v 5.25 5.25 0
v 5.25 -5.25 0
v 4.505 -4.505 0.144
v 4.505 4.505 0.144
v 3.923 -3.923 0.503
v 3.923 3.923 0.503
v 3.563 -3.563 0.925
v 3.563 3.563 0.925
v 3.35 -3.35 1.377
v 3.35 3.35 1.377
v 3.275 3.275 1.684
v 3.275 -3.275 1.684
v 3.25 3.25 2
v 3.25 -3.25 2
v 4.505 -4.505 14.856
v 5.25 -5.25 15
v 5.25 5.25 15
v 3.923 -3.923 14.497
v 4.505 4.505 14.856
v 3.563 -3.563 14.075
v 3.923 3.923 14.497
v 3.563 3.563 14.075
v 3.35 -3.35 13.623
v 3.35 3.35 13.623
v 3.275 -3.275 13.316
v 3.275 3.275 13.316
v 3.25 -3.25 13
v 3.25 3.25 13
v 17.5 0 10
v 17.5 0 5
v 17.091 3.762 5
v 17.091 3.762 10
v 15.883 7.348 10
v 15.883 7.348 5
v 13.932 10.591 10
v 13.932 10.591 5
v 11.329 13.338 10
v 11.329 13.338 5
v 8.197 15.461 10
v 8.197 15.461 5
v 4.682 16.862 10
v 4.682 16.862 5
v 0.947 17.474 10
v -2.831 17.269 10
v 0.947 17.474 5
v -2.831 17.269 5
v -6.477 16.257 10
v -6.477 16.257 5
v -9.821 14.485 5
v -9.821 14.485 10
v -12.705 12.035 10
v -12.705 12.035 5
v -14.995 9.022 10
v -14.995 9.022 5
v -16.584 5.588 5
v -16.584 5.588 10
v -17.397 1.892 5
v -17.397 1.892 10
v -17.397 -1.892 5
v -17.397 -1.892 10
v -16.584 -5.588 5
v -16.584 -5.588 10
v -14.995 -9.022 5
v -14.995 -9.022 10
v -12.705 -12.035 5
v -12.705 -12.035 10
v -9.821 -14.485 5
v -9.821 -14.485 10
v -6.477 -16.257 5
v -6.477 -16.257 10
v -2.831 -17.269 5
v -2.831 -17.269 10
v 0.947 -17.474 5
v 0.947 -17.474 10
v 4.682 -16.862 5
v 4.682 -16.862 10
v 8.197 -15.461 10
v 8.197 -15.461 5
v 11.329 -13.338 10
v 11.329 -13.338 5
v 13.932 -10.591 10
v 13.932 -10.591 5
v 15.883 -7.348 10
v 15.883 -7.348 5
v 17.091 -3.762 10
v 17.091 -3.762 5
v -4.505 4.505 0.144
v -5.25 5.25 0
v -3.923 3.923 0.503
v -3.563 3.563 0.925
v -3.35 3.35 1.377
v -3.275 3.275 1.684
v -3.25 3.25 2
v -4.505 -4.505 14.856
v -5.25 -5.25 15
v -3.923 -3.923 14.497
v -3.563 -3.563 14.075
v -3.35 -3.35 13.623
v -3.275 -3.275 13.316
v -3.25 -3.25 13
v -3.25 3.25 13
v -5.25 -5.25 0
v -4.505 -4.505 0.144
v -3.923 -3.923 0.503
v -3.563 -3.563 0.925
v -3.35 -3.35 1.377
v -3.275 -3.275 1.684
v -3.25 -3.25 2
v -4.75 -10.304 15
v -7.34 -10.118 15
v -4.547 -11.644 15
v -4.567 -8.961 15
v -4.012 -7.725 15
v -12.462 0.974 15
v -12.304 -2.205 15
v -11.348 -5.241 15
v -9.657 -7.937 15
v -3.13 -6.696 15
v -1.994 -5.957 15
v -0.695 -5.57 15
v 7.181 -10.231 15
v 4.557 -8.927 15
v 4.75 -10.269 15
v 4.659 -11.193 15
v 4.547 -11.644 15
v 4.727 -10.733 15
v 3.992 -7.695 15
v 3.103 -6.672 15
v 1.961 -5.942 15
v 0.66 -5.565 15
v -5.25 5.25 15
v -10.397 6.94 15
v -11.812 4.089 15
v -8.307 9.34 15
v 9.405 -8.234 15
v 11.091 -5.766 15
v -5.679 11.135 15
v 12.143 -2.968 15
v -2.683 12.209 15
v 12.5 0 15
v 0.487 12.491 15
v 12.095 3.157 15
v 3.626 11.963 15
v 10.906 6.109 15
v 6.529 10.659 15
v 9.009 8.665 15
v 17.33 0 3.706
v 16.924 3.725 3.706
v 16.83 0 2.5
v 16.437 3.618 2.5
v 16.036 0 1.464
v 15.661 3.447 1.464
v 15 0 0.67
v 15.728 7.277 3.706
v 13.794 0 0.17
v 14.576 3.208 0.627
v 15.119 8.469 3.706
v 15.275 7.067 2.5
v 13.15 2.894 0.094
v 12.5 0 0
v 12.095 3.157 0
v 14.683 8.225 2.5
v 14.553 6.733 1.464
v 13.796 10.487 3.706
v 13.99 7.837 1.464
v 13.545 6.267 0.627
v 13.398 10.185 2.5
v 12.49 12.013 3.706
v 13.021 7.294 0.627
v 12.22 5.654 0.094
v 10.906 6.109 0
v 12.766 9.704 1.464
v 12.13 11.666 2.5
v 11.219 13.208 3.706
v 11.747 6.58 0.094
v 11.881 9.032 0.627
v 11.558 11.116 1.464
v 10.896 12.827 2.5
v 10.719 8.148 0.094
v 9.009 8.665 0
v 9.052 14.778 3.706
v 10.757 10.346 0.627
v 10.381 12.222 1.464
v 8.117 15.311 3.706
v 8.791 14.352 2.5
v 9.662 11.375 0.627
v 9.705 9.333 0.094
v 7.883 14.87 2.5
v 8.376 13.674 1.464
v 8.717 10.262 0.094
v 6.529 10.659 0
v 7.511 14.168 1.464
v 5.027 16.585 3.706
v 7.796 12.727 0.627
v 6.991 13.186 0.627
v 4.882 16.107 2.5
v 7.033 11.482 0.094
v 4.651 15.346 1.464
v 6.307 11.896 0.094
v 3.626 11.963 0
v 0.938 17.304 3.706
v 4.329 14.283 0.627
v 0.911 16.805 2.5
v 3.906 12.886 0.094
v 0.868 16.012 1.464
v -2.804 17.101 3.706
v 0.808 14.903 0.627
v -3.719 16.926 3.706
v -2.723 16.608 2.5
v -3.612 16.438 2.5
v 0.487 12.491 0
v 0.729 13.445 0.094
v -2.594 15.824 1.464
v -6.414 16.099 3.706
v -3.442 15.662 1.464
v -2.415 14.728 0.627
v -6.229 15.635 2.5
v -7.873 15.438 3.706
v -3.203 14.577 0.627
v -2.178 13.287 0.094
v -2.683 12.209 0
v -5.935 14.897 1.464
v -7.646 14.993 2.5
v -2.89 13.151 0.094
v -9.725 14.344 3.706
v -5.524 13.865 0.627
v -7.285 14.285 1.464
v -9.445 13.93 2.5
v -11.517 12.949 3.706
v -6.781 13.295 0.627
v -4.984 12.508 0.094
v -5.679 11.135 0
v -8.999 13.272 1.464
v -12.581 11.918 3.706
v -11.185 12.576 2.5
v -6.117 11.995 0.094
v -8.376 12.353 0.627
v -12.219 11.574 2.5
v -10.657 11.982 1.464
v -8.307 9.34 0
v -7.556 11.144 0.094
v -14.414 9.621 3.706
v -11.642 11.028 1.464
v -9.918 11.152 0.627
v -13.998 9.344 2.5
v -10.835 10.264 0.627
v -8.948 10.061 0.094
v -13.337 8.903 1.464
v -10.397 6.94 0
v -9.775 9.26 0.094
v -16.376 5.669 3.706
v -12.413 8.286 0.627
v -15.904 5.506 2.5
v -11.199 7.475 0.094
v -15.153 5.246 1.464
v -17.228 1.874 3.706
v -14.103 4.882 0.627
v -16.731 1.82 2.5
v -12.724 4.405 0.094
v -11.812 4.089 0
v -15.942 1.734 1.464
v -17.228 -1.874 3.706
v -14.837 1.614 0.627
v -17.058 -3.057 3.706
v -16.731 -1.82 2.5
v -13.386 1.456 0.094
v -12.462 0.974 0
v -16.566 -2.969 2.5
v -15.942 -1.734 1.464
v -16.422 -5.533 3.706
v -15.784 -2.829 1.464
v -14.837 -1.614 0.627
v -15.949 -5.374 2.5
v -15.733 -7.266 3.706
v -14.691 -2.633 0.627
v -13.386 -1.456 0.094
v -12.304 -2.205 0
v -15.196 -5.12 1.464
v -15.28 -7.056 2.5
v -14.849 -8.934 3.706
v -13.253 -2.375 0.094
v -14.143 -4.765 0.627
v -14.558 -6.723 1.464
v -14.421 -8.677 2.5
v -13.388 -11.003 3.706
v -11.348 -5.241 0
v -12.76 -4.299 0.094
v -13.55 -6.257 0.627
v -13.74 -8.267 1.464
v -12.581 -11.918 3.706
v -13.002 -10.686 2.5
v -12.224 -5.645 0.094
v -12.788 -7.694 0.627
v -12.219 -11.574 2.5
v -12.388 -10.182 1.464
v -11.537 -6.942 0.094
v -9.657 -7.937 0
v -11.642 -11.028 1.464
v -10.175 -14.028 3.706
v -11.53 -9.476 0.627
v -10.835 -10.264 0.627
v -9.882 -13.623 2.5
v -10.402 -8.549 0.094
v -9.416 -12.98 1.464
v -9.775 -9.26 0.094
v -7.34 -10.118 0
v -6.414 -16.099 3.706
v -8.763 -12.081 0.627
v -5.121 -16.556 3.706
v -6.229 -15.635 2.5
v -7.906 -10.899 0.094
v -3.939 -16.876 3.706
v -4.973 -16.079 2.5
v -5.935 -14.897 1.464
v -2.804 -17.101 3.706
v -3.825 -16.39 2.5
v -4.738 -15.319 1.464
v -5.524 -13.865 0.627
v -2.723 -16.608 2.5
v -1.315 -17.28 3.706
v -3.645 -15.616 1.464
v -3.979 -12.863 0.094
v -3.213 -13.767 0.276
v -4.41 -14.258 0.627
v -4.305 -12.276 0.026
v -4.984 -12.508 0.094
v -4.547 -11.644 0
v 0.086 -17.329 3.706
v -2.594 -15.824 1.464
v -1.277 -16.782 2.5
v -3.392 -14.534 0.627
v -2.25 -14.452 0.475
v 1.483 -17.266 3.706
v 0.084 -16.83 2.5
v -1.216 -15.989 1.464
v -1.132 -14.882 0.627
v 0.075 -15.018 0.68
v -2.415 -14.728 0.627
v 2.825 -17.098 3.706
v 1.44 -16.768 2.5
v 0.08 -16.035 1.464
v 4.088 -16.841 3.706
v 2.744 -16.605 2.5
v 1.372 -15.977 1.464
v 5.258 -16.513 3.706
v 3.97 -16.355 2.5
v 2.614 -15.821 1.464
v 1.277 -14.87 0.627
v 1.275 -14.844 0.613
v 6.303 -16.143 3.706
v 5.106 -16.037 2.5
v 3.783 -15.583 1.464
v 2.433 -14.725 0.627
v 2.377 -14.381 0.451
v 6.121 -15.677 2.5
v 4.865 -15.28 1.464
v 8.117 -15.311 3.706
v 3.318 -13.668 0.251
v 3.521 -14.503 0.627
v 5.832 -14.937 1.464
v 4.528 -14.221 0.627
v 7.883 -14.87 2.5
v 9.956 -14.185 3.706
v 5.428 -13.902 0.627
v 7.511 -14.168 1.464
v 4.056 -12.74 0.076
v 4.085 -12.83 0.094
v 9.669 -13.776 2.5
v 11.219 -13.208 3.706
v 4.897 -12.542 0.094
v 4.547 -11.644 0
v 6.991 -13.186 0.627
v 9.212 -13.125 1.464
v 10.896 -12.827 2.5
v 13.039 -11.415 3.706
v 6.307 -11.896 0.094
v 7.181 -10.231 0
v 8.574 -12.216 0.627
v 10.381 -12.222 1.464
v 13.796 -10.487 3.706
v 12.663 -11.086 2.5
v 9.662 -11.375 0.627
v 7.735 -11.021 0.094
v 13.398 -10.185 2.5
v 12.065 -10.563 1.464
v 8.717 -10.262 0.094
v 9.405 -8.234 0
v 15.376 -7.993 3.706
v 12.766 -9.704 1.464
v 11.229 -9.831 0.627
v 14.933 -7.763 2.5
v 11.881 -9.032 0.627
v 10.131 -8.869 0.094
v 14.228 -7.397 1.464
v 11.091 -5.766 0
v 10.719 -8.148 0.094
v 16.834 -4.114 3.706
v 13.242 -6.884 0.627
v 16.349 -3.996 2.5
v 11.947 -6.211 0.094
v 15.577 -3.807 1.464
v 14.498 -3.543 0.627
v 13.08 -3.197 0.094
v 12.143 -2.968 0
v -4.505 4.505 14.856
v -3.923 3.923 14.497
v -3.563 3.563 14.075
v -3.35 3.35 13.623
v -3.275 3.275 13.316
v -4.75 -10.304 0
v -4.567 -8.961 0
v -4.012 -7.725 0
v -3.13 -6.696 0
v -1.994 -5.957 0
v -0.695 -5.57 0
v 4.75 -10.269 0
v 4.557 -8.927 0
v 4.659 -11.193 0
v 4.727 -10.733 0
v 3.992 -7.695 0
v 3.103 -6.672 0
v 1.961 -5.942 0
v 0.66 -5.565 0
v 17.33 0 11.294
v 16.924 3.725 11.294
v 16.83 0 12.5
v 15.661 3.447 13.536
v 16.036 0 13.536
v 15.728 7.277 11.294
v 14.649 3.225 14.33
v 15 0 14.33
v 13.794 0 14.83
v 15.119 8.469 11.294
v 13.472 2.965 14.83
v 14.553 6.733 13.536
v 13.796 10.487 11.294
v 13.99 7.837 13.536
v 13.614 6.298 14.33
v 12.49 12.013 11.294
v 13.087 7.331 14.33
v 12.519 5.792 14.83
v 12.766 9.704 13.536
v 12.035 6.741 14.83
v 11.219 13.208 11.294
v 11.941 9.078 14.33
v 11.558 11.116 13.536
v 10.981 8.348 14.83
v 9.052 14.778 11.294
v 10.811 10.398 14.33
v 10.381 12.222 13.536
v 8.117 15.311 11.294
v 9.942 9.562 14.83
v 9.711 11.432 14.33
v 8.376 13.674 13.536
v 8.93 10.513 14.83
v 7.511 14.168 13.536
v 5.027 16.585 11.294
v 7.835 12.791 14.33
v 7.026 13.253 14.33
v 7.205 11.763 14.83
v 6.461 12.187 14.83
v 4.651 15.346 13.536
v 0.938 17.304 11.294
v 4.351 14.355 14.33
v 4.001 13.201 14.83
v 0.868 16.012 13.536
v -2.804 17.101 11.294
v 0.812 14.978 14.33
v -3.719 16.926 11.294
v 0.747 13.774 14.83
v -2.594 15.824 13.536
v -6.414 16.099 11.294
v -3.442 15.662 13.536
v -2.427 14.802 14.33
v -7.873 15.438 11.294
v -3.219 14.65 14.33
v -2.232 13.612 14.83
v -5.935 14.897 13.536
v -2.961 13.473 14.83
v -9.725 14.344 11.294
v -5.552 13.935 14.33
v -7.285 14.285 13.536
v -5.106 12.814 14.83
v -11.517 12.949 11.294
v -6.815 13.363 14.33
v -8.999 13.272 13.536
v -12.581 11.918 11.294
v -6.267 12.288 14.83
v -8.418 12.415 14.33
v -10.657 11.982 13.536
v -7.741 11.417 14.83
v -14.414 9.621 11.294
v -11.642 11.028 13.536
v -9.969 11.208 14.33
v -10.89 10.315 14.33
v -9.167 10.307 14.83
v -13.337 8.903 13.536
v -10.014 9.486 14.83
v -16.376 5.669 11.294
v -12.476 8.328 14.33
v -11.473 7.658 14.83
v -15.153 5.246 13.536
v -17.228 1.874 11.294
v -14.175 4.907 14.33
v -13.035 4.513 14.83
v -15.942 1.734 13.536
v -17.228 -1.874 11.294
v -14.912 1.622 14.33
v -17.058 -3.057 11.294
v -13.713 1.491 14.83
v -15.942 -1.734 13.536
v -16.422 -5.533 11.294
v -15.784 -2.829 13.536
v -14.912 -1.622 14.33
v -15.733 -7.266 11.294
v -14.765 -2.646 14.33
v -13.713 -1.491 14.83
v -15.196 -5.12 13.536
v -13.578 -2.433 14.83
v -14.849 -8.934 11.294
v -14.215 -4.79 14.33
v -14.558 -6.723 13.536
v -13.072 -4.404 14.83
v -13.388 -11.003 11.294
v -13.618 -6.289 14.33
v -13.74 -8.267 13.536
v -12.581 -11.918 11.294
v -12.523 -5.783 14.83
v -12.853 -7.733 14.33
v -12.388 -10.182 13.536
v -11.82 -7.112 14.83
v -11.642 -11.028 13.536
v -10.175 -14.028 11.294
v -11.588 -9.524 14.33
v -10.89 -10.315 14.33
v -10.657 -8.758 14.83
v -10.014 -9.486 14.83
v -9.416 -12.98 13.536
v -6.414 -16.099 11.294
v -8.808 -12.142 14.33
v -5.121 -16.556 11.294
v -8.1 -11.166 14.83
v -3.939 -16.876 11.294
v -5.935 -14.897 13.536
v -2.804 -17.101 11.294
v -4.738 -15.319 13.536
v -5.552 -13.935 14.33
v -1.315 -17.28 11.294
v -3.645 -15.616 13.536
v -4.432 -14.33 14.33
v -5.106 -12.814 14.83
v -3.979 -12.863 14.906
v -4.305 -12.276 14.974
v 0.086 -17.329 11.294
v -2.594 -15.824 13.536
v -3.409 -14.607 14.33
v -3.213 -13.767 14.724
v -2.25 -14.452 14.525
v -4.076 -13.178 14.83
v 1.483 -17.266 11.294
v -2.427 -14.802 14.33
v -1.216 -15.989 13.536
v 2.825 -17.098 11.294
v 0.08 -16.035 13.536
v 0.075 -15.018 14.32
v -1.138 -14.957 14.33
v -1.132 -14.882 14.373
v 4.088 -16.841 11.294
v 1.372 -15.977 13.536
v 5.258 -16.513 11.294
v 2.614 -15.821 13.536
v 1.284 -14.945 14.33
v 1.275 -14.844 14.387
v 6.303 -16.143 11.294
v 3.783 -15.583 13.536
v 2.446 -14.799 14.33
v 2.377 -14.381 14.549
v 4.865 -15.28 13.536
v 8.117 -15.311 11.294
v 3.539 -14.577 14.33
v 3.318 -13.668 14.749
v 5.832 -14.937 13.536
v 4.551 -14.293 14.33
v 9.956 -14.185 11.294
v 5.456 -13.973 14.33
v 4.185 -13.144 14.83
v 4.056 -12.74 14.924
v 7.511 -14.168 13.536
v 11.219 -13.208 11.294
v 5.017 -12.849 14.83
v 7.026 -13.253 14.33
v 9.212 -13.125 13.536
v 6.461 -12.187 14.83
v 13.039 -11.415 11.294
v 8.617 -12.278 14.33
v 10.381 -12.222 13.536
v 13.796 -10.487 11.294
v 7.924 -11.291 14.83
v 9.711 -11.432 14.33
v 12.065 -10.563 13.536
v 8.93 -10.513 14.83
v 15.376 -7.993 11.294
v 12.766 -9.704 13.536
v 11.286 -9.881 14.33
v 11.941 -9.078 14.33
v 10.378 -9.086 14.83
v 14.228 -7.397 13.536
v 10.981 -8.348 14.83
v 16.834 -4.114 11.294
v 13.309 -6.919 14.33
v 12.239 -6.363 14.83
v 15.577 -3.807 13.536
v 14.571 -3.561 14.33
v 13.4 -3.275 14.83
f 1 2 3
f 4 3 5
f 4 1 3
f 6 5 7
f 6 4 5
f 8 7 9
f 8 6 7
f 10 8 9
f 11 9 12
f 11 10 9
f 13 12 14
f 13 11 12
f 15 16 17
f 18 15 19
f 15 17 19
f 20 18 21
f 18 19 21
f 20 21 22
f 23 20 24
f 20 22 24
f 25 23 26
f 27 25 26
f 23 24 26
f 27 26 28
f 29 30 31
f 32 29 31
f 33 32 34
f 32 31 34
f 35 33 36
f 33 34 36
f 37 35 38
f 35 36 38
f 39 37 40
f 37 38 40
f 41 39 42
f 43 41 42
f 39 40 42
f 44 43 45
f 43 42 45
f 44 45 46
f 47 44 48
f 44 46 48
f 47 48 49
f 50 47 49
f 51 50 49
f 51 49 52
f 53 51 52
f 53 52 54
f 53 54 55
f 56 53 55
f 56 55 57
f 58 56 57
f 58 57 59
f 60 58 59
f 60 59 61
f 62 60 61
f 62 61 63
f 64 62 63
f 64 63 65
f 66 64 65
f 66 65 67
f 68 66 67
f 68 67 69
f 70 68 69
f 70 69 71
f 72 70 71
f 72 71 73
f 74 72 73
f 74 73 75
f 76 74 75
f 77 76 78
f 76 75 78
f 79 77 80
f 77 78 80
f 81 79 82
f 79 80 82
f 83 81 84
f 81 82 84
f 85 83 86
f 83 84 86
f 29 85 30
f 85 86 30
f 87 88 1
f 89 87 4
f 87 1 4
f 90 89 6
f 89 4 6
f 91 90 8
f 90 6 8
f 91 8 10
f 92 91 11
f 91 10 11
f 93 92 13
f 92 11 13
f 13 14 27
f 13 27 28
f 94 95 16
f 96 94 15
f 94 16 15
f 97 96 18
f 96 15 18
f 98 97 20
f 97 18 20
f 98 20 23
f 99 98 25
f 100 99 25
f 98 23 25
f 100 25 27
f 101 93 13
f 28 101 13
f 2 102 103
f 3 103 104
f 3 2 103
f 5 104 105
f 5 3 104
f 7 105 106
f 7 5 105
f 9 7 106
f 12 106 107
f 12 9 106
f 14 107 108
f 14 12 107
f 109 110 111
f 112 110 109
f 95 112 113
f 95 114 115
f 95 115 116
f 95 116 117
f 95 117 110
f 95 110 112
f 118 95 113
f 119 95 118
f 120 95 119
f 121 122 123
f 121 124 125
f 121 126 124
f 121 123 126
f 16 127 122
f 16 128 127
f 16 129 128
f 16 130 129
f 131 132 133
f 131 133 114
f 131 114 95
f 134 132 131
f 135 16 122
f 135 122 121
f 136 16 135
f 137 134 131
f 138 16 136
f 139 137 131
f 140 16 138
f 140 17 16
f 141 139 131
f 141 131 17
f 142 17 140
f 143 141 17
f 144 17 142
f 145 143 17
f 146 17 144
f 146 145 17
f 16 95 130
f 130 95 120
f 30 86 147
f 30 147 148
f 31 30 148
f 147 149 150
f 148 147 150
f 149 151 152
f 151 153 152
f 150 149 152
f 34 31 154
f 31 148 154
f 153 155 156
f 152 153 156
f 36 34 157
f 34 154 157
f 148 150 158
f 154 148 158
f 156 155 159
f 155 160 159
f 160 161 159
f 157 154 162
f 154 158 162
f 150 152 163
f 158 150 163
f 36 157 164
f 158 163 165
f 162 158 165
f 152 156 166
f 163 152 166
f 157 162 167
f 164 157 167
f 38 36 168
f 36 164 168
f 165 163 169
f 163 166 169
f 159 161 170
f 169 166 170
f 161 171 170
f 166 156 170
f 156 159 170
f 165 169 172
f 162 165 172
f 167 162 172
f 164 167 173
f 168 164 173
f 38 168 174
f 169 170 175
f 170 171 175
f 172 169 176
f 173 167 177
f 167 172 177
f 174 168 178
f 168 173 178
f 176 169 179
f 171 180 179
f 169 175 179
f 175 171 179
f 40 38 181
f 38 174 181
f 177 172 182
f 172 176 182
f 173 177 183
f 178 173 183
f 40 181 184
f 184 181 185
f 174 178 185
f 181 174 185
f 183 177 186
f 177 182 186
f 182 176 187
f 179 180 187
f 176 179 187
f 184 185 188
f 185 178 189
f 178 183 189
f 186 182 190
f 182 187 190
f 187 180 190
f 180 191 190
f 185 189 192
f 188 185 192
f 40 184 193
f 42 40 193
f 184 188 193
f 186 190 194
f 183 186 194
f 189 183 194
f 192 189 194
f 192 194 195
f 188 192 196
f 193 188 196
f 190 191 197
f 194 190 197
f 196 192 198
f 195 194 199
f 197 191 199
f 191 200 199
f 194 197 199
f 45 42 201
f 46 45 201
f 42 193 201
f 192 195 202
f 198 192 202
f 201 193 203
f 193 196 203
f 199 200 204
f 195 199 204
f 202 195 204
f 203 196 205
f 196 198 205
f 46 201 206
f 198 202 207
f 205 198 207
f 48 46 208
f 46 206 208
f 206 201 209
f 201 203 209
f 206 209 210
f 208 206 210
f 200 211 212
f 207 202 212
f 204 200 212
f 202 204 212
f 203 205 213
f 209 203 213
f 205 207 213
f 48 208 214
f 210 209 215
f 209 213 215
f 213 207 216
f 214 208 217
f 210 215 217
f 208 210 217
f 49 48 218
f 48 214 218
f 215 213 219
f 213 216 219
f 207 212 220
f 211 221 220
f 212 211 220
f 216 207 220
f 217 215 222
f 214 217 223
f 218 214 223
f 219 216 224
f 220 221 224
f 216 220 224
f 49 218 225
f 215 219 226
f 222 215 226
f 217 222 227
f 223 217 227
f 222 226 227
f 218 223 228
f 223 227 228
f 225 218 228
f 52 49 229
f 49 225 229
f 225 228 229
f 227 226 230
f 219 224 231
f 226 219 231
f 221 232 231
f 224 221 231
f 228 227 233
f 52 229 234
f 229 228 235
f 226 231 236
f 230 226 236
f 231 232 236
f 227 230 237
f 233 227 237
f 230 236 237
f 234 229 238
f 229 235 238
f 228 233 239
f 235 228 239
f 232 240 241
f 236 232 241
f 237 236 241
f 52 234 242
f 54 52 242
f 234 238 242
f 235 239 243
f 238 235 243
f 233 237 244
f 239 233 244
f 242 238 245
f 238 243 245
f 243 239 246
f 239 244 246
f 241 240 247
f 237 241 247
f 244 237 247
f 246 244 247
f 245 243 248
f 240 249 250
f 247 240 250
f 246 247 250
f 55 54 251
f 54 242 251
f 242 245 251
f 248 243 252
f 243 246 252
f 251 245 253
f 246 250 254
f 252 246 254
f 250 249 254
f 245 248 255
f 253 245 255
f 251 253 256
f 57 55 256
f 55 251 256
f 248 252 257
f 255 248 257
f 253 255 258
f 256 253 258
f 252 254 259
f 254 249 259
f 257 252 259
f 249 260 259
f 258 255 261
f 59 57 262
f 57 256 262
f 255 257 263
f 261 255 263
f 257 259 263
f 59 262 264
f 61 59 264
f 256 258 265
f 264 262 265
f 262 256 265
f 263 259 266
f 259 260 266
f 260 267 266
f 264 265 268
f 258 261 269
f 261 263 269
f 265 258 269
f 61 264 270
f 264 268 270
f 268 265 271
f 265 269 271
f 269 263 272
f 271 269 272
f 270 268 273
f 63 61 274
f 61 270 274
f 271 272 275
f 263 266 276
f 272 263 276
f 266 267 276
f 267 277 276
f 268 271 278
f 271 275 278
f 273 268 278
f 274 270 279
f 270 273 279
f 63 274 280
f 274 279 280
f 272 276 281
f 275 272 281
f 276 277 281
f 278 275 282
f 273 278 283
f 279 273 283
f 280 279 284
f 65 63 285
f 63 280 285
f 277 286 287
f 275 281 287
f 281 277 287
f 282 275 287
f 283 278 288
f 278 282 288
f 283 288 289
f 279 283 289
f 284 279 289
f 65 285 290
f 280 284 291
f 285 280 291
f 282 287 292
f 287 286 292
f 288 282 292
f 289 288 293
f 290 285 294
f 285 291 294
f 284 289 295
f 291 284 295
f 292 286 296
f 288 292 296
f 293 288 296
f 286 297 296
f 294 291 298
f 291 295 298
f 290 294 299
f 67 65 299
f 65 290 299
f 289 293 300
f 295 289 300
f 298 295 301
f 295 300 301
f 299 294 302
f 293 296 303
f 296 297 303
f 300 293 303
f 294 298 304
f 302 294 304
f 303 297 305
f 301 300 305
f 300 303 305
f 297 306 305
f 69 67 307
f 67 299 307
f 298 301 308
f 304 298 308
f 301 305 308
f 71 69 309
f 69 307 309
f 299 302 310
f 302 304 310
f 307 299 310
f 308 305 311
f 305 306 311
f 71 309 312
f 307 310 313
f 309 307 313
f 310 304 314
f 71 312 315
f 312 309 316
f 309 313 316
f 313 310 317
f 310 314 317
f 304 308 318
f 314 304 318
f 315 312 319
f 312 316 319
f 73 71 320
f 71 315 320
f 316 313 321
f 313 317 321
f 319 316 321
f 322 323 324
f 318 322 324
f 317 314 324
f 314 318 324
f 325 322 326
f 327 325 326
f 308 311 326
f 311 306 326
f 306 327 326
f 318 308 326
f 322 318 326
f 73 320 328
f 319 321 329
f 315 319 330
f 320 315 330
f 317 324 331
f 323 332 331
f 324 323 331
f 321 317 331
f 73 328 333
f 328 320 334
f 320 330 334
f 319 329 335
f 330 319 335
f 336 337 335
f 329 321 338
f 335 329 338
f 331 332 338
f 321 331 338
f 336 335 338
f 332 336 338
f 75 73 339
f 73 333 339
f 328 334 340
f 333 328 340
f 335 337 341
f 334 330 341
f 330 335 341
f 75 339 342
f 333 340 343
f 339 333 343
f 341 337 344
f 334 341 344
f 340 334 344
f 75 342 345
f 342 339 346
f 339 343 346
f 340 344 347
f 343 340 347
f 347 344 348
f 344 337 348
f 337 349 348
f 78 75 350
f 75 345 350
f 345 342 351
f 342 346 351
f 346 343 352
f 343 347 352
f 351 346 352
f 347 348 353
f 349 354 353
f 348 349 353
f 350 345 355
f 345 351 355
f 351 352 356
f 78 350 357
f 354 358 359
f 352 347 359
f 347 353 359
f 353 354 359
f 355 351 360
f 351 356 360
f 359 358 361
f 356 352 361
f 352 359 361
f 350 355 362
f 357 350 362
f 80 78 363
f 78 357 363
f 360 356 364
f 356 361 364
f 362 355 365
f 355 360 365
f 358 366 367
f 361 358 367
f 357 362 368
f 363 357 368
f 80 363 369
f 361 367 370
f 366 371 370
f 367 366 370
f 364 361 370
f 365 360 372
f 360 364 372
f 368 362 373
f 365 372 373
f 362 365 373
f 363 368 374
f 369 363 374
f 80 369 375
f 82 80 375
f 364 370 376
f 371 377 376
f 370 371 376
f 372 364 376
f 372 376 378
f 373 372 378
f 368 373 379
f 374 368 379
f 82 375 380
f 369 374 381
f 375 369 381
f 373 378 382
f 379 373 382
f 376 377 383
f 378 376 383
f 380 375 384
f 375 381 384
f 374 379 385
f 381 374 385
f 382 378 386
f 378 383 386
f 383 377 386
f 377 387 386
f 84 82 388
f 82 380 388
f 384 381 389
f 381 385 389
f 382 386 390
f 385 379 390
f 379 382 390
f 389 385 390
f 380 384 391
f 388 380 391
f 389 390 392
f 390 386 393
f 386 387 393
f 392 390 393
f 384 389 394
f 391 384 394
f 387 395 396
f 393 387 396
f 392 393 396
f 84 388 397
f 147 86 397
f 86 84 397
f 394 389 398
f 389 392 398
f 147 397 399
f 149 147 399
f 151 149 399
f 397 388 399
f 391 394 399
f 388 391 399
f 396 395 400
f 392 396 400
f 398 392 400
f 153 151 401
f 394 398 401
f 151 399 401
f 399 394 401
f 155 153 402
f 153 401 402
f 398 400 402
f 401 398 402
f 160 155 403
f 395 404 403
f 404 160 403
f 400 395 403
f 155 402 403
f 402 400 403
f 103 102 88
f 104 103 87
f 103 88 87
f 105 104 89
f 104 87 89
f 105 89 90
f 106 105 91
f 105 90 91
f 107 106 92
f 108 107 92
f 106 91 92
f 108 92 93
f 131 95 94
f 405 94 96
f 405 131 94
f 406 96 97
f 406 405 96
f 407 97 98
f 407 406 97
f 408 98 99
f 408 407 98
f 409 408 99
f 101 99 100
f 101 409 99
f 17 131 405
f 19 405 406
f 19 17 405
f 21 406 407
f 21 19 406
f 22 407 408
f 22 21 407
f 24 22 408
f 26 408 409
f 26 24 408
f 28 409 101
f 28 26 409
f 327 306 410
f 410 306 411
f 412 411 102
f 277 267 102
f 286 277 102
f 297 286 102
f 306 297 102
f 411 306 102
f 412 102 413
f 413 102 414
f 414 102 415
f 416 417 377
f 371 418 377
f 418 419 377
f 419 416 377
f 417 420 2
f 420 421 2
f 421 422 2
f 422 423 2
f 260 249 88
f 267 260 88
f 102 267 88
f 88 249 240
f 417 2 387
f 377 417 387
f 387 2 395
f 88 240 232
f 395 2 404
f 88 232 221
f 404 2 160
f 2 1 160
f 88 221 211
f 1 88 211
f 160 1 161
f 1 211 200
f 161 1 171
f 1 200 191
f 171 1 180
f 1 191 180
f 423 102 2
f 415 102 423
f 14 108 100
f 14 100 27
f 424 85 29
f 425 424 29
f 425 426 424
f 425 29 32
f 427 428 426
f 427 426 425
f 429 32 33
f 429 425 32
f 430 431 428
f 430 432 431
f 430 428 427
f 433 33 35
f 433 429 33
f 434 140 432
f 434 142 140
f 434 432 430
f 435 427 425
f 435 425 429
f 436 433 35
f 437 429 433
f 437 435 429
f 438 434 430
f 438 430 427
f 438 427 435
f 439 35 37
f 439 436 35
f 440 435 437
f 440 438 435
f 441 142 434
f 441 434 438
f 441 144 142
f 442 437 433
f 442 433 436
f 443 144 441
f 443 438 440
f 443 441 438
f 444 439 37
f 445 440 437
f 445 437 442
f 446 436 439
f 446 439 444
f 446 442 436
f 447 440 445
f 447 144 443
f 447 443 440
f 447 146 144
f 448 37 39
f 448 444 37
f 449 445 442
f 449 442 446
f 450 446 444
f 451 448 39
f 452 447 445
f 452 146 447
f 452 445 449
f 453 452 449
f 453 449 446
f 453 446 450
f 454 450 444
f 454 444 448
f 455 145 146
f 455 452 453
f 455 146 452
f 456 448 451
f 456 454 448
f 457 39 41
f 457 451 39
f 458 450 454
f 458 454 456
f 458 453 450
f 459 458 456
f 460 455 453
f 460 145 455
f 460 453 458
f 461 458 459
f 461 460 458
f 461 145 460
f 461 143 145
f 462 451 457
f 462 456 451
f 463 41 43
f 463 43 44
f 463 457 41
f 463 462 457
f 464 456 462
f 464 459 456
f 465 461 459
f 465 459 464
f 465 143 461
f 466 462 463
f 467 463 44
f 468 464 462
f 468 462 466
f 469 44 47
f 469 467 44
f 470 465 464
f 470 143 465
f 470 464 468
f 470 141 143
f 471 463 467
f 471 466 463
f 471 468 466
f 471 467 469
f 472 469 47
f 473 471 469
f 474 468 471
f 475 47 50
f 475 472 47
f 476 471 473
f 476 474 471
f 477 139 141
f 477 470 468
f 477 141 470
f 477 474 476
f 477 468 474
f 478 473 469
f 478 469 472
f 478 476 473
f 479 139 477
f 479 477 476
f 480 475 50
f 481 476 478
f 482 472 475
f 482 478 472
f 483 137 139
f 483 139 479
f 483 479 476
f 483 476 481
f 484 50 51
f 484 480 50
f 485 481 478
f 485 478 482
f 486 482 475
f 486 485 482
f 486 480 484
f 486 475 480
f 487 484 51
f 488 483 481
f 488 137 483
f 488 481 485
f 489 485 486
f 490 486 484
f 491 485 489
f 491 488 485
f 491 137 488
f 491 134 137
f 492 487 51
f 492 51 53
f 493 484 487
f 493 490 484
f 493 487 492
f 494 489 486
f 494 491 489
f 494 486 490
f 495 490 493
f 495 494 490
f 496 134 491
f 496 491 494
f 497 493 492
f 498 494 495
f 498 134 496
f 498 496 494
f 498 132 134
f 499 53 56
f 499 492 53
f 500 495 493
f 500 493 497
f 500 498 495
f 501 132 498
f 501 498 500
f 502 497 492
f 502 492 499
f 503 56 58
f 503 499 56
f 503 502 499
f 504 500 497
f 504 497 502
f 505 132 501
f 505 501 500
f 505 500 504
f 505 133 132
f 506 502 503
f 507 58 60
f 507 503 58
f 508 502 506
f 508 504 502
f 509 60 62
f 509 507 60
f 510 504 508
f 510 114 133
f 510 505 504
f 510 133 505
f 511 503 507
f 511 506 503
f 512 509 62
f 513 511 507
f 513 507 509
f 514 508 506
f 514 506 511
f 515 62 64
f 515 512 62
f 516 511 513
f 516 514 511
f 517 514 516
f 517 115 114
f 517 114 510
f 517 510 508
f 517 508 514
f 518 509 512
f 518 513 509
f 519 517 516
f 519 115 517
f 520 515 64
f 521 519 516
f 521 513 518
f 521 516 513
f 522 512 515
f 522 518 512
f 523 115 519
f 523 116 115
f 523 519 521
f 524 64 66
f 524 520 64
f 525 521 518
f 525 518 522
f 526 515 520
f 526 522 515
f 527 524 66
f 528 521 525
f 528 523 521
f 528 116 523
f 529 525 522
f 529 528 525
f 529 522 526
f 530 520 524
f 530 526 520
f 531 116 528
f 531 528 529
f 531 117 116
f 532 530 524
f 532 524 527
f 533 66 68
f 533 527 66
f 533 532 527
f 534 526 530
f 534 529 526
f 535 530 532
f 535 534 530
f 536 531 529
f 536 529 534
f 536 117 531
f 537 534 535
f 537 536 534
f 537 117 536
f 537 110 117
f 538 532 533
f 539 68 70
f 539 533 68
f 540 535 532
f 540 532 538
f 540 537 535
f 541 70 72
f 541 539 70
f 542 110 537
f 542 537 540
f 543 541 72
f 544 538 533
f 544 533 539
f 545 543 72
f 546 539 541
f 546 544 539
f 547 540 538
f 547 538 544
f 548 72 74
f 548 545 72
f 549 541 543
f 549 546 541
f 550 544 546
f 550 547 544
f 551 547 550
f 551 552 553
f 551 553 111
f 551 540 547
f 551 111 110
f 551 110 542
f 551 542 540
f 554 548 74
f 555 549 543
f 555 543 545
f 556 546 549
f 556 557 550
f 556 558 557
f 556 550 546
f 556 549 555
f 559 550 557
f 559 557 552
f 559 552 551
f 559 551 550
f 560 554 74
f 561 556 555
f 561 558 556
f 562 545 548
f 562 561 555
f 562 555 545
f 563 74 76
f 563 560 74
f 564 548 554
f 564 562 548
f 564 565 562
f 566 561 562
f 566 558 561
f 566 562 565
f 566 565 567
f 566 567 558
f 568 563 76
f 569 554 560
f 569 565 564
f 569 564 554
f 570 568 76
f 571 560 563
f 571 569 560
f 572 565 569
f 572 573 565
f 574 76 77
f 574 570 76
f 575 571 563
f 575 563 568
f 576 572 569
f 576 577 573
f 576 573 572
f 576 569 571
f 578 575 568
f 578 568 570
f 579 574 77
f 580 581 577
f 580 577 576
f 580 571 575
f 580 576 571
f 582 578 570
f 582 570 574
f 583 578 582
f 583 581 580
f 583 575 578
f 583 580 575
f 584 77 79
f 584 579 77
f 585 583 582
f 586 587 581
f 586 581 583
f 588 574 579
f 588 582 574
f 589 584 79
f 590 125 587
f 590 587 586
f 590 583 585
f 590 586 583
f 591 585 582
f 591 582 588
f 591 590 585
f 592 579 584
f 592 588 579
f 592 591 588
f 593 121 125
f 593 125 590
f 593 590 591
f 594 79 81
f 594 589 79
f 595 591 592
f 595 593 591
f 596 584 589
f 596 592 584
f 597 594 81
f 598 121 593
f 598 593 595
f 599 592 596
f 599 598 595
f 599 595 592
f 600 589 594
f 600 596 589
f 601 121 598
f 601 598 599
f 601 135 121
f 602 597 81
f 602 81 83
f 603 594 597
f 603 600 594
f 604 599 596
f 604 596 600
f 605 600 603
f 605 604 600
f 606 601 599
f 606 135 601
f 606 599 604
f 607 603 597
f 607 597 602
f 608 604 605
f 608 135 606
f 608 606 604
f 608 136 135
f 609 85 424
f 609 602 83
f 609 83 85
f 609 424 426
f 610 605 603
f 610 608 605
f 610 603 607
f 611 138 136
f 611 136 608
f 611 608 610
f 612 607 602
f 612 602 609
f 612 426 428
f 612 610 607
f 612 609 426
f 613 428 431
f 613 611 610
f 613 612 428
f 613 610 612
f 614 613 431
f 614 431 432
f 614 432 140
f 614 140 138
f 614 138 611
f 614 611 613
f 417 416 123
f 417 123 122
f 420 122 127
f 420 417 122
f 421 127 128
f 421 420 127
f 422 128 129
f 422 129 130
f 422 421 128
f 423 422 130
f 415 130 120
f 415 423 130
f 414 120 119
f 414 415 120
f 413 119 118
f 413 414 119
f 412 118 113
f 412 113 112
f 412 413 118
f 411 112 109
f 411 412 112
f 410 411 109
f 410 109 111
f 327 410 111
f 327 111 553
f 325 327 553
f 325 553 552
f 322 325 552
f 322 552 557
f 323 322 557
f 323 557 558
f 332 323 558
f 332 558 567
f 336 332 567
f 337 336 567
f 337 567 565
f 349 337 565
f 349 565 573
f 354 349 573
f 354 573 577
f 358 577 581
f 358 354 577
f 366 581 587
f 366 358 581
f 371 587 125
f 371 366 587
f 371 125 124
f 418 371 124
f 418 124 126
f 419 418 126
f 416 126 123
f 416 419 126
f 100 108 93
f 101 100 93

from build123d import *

# Parameters (mm, degrees)
F0_R     = 17.5
F0_R_2   = 4.75
F0_W     = 6.5
F0_H     = 6.5
F1_DEPTH = 15
F3_R     = 2


# Not quite as in the source:
# - a fillet or chamfer that OpenCascade refuses, or shapes differently, is made with other operations: its cross-section is extruded or revolved along the edge and cut away or added
# - a feature names something its author has since deleted; it is built from what else it names


with BuildPart() as f1:
    # F0 (on Top) → F1 (new body)
    with BuildSketch(Plane.XY):
        Circle(F0_R)
        with Locations((0, -10.2685028687)):
            Circle(F0_R_2, mode=Mode.SUBTRACT)
        Rectangle(F0_W, F0_H, mode=Mode.SUBTRACT)
    extrude(amount=F1_DEPTH)

    # F2: fillet of radius 5 on 2 edges, made by hand

    # F2_s1 → F2_t2 (revolve, cut)
    with BuildSketch(Plane.XZ):
        with BuildLine():
            ThreePointArc((17.5, 10), (16.0355339059, 13.5355339059), (12.5, 15))
            Line((12.5, 15), (17.5, 15))
            Line((17.5, 15), (17.5, 10))
        make_face()
    revolve(axis=Axis((0, 0, 15), (0, 0, 1)), mode=Mode.SUBTRACT)

    # F2_s3 → F2_t4 (revolve, cut)
    with BuildSketch(Plane.XZ):
        with BuildLine():
            ThreePointArc((17.5, 5), (16.0355339059, 1.4644660941), (12.5, 0))
            Line((12.5, 0), (17.5, 0))
            Line((17.5, 0), (17.5, 5))
        make_face()
    revolve(axis=Axis((0, 0, 0), (0, 0, 1)), mode=Mode.SUBTRACT)

    # F3
    f3_edges = [f1.edges().sort_by_distance(p)[0] for p in [
        (-3.25, 0, 15),
        (0, -3.25, 15),
        (0, 3.25, 15),
        (3.25, 0, 15),
        (-3.25, 0, 0),
        (0, -3.25, 0),
        (3.25, 0, 0),
        (0, 3.25, 0),
    ]]
    fillet(f3_edges, radius=F3_R)


solid = f1.part
